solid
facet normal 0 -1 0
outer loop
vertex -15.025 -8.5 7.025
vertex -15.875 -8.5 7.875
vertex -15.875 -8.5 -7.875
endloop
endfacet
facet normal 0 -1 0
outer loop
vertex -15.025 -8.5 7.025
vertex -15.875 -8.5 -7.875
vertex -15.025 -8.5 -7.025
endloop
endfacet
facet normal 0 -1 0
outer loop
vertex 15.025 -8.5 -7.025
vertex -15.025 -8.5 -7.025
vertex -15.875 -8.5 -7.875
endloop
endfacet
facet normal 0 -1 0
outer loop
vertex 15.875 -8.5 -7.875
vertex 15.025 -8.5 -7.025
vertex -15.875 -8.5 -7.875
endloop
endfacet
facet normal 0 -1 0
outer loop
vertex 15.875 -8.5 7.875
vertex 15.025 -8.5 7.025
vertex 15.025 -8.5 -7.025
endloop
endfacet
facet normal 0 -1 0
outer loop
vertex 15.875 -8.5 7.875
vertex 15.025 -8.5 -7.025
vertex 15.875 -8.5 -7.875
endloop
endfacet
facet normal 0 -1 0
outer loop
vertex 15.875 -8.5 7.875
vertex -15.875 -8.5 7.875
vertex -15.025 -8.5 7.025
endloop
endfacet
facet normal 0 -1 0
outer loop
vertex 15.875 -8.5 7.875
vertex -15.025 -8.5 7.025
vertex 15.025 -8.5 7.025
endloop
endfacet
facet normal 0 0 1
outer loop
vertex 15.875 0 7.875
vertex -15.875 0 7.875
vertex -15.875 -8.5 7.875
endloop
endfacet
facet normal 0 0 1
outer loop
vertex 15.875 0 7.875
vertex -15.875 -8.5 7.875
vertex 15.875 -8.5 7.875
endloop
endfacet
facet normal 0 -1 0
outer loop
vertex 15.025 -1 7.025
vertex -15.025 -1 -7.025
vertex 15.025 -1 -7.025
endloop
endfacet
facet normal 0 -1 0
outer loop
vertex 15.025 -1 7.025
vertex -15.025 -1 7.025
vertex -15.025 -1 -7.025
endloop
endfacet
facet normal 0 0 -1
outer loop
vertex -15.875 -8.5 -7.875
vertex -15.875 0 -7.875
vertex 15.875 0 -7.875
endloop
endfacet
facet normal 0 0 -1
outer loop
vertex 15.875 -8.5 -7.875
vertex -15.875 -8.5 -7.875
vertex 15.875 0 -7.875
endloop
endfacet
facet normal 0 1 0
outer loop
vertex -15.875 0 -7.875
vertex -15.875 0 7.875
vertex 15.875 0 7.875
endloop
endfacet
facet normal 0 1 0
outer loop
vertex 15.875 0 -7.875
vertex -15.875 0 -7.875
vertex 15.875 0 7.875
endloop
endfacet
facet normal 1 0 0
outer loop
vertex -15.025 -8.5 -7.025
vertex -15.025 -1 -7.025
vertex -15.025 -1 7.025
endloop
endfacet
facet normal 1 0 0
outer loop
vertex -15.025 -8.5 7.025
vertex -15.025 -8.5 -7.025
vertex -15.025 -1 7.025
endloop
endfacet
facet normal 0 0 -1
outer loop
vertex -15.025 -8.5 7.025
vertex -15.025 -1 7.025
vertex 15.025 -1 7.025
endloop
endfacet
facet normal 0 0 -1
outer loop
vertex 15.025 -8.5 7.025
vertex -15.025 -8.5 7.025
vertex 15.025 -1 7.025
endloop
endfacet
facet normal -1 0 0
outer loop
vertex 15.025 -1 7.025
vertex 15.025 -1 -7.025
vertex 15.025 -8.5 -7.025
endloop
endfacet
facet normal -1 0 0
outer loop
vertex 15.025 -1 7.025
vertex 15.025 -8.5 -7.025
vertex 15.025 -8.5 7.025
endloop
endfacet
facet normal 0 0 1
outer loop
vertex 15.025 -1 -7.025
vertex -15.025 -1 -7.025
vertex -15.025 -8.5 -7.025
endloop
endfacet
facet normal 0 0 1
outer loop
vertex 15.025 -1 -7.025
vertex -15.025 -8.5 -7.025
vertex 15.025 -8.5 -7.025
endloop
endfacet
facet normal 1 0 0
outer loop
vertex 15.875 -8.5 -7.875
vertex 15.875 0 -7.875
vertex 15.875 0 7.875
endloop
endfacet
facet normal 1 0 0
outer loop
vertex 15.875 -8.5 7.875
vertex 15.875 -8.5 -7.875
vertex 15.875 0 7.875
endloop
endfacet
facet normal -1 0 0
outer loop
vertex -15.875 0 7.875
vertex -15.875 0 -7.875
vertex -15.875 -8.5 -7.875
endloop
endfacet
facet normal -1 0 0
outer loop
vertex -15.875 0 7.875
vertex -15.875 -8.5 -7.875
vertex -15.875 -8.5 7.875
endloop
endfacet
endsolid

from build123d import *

# Parameters (mm, degrees)
F0_W     = 31.75
F0_H     = 15.75
F0_W_2   = 30.05
F0_H_2   = 14.05
F1_DEPTH = 1
F2_DEPTH = 8.5


with BuildPart() as f1:
    # F0 (on Front) → F1 (new body)
    with BuildSketch(Plane.XZ):
        Rectangle(F0_W, F0_H)
        Rectangle(F0_W_2, F0_H_2, mode=Mode.SUBTRACT)
        Rectangle(F0_W_2, F0_H_2)
    extrude(amount=F1_DEPTH)

    # F0 (on Front) → F2 (join)
    with BuildSketch(Plane.XZ):
        Rectangle(F0_W, F0_H)
        Rectangle(F0_W_2, F0_H_2, mode=Mode.SUBTRACT)
    extrude(amount=F2_DEPTH)


solid = f1.part
